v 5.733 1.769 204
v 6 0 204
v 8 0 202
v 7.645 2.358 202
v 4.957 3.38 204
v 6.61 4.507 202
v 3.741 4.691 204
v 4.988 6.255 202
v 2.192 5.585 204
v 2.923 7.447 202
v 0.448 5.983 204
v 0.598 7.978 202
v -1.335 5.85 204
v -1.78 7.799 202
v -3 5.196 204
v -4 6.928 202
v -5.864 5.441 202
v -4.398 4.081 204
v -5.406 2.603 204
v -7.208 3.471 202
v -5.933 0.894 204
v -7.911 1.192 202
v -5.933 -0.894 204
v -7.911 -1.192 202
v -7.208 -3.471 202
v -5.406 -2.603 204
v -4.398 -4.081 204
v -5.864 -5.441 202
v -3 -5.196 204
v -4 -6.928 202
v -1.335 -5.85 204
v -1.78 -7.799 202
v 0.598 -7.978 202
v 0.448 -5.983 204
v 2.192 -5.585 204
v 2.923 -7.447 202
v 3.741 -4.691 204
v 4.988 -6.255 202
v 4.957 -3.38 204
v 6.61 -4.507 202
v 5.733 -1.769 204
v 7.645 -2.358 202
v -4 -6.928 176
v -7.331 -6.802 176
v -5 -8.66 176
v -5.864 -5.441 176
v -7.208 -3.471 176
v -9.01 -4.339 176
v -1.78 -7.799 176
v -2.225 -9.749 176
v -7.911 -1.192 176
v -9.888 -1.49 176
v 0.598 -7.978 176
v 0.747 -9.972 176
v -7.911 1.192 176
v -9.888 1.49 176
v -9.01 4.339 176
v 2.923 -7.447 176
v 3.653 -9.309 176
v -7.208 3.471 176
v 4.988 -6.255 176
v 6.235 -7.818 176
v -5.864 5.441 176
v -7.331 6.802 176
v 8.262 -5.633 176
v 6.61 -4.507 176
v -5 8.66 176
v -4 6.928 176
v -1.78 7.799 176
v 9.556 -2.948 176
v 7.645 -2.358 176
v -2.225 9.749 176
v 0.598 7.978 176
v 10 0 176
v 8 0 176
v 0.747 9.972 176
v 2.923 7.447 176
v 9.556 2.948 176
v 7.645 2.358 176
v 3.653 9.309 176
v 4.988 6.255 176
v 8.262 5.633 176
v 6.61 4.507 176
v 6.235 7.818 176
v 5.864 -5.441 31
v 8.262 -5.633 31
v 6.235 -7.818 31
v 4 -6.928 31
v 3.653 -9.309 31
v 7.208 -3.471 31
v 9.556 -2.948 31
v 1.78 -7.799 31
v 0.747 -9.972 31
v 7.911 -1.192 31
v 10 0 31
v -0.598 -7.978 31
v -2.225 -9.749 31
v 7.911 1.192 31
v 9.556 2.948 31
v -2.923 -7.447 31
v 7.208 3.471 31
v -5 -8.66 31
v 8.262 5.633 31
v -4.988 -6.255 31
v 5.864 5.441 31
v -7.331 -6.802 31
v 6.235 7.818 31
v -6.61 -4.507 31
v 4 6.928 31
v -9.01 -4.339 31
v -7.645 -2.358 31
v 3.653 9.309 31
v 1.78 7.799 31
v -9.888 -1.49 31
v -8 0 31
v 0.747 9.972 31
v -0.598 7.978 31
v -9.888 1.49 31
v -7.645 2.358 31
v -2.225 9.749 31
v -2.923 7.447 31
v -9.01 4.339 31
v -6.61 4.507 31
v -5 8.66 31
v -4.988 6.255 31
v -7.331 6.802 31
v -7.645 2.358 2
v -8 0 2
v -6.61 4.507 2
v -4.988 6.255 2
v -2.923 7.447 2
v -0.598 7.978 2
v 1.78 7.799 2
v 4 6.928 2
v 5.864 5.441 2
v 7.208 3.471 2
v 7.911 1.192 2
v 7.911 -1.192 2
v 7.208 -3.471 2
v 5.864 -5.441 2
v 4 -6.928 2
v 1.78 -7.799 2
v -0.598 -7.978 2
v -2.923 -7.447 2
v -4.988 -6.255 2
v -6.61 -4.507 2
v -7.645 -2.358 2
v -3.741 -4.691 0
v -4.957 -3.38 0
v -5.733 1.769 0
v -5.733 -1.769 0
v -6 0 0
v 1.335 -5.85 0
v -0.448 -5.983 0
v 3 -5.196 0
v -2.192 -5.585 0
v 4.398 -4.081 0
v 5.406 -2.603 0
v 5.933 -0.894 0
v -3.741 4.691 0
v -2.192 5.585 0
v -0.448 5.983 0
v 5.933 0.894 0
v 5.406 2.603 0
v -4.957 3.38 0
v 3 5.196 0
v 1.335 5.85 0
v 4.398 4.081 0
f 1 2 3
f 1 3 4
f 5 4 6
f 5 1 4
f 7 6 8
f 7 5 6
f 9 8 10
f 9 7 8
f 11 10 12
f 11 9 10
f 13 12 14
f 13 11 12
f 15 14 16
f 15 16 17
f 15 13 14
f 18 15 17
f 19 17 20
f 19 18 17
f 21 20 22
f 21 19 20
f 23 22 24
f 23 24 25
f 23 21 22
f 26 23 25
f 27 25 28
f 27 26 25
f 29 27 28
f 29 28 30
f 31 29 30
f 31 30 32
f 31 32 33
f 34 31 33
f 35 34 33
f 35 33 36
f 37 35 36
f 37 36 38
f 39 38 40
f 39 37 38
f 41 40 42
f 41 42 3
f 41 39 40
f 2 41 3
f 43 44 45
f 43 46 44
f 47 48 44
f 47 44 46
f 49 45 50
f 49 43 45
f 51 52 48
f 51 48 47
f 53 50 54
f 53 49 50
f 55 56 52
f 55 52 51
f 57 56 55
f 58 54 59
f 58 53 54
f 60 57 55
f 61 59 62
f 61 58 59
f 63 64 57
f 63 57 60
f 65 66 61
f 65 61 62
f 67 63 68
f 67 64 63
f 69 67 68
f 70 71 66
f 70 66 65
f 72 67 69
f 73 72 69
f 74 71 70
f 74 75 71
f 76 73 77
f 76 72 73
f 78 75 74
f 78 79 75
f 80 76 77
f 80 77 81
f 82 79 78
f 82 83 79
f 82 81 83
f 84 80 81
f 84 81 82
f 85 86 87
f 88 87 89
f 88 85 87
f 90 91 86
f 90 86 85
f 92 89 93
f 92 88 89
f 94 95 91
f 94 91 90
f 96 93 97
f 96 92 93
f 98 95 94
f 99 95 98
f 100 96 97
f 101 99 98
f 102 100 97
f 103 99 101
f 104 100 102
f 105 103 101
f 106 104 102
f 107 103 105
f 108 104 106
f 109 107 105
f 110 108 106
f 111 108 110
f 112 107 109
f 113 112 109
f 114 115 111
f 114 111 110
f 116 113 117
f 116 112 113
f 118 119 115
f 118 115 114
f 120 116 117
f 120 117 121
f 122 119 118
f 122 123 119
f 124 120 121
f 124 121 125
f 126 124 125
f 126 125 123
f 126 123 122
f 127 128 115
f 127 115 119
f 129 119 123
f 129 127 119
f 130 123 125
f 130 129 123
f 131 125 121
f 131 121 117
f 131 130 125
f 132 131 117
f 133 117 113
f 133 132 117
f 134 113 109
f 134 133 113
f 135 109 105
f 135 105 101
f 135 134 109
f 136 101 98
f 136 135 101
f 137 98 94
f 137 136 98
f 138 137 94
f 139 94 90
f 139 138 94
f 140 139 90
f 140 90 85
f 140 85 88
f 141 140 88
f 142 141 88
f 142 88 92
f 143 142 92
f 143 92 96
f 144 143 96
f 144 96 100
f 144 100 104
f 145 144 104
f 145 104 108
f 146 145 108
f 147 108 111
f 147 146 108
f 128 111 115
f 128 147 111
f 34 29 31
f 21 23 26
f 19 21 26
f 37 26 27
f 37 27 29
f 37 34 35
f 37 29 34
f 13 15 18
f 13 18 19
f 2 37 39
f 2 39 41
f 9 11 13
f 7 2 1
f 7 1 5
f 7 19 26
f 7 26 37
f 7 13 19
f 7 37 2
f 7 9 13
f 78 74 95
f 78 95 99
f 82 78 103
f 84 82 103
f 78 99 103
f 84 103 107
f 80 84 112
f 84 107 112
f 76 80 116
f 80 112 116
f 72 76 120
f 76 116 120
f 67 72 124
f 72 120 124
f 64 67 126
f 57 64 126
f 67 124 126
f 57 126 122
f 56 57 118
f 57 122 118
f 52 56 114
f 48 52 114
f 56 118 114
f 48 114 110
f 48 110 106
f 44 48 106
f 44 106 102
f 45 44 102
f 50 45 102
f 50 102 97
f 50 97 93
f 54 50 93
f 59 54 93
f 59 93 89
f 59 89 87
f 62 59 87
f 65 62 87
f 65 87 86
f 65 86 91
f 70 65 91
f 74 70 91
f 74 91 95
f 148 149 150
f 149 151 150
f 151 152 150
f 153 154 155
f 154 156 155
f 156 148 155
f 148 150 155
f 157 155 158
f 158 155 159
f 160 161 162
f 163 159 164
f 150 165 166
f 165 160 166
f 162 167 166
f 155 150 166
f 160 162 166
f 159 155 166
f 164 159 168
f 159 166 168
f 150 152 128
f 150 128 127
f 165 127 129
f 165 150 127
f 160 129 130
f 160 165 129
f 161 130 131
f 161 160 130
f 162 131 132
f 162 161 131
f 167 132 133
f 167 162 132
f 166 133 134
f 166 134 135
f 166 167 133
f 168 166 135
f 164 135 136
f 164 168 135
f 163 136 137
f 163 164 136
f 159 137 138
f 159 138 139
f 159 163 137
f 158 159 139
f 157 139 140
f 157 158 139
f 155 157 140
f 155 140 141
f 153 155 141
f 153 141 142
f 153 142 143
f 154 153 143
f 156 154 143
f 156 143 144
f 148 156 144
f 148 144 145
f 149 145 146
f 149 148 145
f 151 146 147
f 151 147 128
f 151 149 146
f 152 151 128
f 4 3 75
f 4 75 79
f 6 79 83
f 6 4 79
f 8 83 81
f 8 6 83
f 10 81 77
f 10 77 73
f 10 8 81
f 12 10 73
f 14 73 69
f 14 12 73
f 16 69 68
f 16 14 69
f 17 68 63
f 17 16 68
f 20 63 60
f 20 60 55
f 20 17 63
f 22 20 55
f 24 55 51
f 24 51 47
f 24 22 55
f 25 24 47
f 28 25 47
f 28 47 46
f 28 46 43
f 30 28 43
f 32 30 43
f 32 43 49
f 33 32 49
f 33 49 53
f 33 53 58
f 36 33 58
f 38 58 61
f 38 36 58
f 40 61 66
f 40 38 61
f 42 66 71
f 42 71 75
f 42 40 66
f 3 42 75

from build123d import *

# Parameters (mm, degrees)
SKIZZE1_R                       = 10
AUFSATZ_LINEAR_AUSTRAGEN1_DEPTH = 204
SKIZZE2_R                       = 10
SKIZZE2_R_2                     = 8
SCHNITT_LINEAR_AUSTRAGEN1_DEPTH = 31
SKIZZE3_R                       = 10
SKIZZE3_R_2                     = 8
SCHNITT_LINEAR_AUSTRAGEN2_DEPTH = 28
FASE1_SIZE                      = 2
FASE2_SIZE                      = 2


with BuildPart() as part:
    # Skizze1 → Aufsatz-Linear austragen1 (new body)
    with BuildSketch(Plane.XY):
        Circle(SKIZZE1_R)
    extrude(amount=AUFSATZ_LINEAR_AUSTRAGEN1_DEPTH)

    # Skizze2 → Schnitt-Linear austragen1 (cut)
    with BuildSketch(Plane(origin=(0, 0, 0), x_dir=(-1, 0, 0), z_dir=(0, 0, -1))):
        Circle(SKIZZE2_R)
        Circle(SKIZZE2_R_2, mode=Mode.SUBTRACT)
    extrude(amount=-SCHNITT_LINEAR_AUSTRAGEN1_DEPTH, mode=Mode.SUBTRACT)

    # Skizze3 → Schnitt-Linear austragen2 (cut)
    with BuildSketch(Plane.XY.offset(204)):
        Circle(SKIZZE3_R)
        Circle(SKIZZE3_R_2, mode=Mode.SUBTRACT)
    extrude(amount=-SCHNITT_LINEAR_AUSTRAGEN2_DEPTH, mode=Mode.SUBTRACT)

    # Fase1
    fase1_edges = [part.edges().sort_by_distance(p)[0] for p in [
        (-8, 0, 204),
    ]]
    chamfer(fase1_edges, length=FASE1_SIZE)

    # Fase2
    fase2_edges = [part.edges().sort_by_distance(p)[0] for p in [
        (8, 0, 0),
    ]]
    chamfer(fase2_edges, length=FASE2_SIZE)


solid = part.part
